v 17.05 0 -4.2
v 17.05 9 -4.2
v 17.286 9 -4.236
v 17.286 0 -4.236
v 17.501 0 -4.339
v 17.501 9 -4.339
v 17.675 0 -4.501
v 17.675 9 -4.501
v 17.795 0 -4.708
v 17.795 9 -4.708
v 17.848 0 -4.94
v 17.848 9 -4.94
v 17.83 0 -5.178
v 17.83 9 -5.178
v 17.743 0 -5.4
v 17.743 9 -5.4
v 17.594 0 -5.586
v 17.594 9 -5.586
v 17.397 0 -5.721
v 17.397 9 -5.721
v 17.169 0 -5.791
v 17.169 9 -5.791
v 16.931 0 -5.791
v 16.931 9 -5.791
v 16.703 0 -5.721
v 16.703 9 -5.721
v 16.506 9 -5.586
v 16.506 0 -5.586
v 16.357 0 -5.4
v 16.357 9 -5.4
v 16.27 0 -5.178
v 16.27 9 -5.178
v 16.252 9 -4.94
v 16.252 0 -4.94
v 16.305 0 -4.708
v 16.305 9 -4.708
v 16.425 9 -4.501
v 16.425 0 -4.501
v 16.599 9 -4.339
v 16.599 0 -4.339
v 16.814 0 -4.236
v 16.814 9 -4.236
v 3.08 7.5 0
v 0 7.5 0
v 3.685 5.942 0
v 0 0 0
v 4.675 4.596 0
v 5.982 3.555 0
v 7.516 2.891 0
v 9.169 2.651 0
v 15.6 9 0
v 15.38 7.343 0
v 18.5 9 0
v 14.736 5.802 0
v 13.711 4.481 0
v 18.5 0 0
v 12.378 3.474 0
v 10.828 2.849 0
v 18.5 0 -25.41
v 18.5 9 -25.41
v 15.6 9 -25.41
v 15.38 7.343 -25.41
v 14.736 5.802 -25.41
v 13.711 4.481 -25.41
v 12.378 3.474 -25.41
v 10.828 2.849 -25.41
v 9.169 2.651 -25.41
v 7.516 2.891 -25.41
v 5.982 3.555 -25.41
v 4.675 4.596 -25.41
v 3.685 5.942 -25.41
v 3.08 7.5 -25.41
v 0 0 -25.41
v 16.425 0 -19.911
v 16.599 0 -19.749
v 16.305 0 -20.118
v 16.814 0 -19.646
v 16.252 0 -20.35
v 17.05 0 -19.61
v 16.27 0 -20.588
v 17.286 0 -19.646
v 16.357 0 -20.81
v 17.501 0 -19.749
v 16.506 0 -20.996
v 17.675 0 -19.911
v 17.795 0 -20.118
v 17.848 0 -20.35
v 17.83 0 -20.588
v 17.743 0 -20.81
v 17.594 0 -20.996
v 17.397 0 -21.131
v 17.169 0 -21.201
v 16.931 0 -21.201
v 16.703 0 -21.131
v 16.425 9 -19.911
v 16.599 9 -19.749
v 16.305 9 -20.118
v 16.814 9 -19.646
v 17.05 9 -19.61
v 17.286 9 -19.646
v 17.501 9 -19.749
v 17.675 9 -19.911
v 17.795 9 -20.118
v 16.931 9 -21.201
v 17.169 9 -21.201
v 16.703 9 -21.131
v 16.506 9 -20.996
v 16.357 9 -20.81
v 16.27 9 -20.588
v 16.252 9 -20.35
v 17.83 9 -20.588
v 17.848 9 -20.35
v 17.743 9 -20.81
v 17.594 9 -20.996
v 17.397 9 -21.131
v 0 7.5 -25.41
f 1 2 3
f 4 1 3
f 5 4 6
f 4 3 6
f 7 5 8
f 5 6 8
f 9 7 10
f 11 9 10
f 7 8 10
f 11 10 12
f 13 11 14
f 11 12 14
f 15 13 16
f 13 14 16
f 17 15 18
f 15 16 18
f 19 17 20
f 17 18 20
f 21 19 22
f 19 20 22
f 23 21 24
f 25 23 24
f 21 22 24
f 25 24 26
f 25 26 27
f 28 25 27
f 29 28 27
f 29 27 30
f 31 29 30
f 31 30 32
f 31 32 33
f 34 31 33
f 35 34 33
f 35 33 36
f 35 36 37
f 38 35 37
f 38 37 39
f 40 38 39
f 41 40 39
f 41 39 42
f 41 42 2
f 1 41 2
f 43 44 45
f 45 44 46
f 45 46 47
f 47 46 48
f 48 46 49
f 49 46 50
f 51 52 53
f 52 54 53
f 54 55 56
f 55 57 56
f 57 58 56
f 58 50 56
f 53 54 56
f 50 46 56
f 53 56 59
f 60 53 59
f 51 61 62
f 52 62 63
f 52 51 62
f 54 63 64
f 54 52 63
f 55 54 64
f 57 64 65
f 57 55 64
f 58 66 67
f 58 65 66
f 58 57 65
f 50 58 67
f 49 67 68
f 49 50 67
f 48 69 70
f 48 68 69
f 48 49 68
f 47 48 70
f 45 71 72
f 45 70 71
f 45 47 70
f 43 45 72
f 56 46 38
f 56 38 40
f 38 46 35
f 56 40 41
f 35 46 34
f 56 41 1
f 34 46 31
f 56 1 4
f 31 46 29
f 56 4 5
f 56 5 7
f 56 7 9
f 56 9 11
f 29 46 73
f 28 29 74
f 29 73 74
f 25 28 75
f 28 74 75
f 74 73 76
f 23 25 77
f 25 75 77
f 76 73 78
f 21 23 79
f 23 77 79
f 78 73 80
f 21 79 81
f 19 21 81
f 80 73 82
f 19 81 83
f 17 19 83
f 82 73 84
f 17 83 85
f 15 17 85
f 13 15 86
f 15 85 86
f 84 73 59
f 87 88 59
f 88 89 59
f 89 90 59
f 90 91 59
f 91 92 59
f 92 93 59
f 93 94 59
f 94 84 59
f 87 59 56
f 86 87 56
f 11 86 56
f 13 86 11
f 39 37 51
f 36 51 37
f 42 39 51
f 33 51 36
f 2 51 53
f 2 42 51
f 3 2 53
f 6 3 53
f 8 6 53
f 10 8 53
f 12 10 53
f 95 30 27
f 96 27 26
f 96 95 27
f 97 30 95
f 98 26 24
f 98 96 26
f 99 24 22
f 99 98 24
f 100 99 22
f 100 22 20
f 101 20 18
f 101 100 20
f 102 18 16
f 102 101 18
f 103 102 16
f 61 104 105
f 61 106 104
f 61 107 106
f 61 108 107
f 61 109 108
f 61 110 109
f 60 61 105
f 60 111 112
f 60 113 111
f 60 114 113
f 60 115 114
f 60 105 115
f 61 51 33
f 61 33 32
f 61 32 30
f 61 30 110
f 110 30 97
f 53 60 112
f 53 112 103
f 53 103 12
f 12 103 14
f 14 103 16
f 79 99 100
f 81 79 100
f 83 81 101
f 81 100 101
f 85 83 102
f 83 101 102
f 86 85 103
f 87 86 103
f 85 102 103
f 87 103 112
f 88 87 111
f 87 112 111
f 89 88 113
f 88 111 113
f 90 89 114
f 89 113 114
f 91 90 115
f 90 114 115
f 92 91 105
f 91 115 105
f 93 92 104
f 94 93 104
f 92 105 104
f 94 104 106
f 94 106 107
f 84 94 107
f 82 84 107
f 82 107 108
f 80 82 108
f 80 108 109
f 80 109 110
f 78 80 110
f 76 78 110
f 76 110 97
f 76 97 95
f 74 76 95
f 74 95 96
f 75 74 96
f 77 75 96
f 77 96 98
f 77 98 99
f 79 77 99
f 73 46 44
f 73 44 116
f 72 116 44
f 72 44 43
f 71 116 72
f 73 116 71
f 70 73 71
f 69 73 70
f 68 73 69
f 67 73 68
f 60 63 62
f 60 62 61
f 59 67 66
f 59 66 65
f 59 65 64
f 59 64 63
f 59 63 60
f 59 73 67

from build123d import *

# Parameters (mm, degrees)
SKETCH2_W               = 18.5
SKETCH2_H               = 25.41
BOSS_EXTRUDE1_DEPTH     = 9
CUT_EXTRUDE1_DEPTH      = 25.41
CUT_EXTRUDE3_DEPTH      = 33.694312961
CUT_EXTRUDE3_DEPTH_BACK = 25.41
SKETCH10_R              = 0.8
CUT_EXTRUDE4_DEPTH      = 33.694312961


with BuildPart() as part:
    # Sketch2 → Boss-Extrude1 (new body)
    with BuildSketch(Plane(origin=(0, 0, 0), x_dir=(1, 0, 0), z_dir=(0, 1, 0))):
        with Locations((9.25, 12.705)):
            Rectangle(SKETCH2_W, SKETCH2_H)
    extrude(amount=BOSS_EXTRUDE1_DEPTH)

    # Sketch6 → Cut-Extrude1 (cut)
    with BuildSketch(Plane.XY):
        with BuildLine():
            Line((2.9, 9), (15.6, 9))
            ThreePointArc((15.6, 9), (9.25, 2.65), (2.9, 9))
        make_face()
    extrude(amount=-CUT_EXTRUDE1_DEPTH, mode=Mode.SUBTRACT)

    # Sketch14 → Cut-Extrude3 (cut, two sides)
    with BuildSketch(Plane(origin=(0, 0, -25.41), x_dir=(-1, 0, 0), z_dir=(0, 0, -1))) as cut_extrude3_sk:
        Polygon((0, 60.146081223), (0, 9), (0, 7.5), (-3.246658661, 7.5), (-2.9, 9), (8.616604878, 58.832614185), (24.031387378, 159.956651774), (15.4147825, 161.270118812), align=None)
    extrude(amount=CUT_EXTRUDE3_DEPTH, mode=Mode.SUBTRACT)
    extrude(cut_extrude3_sk.sketch, amount=-CUT_EXTRUDE3_DEPTH_BACK, mode=Mode.SUBTRACT)


with BuildPart() as cut_extrude3_kept_piece:
    # of the separate pieces the step leaves, the one the design keeps (cut_extrude3_pieces_kept)
    add(part.part.solids().sort_by_distance((0, 0, 0))[0])

    # Sketch10 → Cut-Extrude4 (cut, through all)
    with BuildSketch(Plane(origin=(0, 9, 0), x_dir=(1, 0, 0), z_dir=(0, 1, 0))):
        with Locations(Location((17.05, 20.41, 0), (0, 0, 270))):
            Circle(SKETCH10_R)
        with Locations(Location((17.05, 5, 0), (0, 0, 270))):
            Circle(SKETCH10_R)
    extrude(amount=-CUT_EXTRUDE4_DEPTH, mode=Mode.SUBTRACT)


solid = cut_extrude3_kept_piece.part
